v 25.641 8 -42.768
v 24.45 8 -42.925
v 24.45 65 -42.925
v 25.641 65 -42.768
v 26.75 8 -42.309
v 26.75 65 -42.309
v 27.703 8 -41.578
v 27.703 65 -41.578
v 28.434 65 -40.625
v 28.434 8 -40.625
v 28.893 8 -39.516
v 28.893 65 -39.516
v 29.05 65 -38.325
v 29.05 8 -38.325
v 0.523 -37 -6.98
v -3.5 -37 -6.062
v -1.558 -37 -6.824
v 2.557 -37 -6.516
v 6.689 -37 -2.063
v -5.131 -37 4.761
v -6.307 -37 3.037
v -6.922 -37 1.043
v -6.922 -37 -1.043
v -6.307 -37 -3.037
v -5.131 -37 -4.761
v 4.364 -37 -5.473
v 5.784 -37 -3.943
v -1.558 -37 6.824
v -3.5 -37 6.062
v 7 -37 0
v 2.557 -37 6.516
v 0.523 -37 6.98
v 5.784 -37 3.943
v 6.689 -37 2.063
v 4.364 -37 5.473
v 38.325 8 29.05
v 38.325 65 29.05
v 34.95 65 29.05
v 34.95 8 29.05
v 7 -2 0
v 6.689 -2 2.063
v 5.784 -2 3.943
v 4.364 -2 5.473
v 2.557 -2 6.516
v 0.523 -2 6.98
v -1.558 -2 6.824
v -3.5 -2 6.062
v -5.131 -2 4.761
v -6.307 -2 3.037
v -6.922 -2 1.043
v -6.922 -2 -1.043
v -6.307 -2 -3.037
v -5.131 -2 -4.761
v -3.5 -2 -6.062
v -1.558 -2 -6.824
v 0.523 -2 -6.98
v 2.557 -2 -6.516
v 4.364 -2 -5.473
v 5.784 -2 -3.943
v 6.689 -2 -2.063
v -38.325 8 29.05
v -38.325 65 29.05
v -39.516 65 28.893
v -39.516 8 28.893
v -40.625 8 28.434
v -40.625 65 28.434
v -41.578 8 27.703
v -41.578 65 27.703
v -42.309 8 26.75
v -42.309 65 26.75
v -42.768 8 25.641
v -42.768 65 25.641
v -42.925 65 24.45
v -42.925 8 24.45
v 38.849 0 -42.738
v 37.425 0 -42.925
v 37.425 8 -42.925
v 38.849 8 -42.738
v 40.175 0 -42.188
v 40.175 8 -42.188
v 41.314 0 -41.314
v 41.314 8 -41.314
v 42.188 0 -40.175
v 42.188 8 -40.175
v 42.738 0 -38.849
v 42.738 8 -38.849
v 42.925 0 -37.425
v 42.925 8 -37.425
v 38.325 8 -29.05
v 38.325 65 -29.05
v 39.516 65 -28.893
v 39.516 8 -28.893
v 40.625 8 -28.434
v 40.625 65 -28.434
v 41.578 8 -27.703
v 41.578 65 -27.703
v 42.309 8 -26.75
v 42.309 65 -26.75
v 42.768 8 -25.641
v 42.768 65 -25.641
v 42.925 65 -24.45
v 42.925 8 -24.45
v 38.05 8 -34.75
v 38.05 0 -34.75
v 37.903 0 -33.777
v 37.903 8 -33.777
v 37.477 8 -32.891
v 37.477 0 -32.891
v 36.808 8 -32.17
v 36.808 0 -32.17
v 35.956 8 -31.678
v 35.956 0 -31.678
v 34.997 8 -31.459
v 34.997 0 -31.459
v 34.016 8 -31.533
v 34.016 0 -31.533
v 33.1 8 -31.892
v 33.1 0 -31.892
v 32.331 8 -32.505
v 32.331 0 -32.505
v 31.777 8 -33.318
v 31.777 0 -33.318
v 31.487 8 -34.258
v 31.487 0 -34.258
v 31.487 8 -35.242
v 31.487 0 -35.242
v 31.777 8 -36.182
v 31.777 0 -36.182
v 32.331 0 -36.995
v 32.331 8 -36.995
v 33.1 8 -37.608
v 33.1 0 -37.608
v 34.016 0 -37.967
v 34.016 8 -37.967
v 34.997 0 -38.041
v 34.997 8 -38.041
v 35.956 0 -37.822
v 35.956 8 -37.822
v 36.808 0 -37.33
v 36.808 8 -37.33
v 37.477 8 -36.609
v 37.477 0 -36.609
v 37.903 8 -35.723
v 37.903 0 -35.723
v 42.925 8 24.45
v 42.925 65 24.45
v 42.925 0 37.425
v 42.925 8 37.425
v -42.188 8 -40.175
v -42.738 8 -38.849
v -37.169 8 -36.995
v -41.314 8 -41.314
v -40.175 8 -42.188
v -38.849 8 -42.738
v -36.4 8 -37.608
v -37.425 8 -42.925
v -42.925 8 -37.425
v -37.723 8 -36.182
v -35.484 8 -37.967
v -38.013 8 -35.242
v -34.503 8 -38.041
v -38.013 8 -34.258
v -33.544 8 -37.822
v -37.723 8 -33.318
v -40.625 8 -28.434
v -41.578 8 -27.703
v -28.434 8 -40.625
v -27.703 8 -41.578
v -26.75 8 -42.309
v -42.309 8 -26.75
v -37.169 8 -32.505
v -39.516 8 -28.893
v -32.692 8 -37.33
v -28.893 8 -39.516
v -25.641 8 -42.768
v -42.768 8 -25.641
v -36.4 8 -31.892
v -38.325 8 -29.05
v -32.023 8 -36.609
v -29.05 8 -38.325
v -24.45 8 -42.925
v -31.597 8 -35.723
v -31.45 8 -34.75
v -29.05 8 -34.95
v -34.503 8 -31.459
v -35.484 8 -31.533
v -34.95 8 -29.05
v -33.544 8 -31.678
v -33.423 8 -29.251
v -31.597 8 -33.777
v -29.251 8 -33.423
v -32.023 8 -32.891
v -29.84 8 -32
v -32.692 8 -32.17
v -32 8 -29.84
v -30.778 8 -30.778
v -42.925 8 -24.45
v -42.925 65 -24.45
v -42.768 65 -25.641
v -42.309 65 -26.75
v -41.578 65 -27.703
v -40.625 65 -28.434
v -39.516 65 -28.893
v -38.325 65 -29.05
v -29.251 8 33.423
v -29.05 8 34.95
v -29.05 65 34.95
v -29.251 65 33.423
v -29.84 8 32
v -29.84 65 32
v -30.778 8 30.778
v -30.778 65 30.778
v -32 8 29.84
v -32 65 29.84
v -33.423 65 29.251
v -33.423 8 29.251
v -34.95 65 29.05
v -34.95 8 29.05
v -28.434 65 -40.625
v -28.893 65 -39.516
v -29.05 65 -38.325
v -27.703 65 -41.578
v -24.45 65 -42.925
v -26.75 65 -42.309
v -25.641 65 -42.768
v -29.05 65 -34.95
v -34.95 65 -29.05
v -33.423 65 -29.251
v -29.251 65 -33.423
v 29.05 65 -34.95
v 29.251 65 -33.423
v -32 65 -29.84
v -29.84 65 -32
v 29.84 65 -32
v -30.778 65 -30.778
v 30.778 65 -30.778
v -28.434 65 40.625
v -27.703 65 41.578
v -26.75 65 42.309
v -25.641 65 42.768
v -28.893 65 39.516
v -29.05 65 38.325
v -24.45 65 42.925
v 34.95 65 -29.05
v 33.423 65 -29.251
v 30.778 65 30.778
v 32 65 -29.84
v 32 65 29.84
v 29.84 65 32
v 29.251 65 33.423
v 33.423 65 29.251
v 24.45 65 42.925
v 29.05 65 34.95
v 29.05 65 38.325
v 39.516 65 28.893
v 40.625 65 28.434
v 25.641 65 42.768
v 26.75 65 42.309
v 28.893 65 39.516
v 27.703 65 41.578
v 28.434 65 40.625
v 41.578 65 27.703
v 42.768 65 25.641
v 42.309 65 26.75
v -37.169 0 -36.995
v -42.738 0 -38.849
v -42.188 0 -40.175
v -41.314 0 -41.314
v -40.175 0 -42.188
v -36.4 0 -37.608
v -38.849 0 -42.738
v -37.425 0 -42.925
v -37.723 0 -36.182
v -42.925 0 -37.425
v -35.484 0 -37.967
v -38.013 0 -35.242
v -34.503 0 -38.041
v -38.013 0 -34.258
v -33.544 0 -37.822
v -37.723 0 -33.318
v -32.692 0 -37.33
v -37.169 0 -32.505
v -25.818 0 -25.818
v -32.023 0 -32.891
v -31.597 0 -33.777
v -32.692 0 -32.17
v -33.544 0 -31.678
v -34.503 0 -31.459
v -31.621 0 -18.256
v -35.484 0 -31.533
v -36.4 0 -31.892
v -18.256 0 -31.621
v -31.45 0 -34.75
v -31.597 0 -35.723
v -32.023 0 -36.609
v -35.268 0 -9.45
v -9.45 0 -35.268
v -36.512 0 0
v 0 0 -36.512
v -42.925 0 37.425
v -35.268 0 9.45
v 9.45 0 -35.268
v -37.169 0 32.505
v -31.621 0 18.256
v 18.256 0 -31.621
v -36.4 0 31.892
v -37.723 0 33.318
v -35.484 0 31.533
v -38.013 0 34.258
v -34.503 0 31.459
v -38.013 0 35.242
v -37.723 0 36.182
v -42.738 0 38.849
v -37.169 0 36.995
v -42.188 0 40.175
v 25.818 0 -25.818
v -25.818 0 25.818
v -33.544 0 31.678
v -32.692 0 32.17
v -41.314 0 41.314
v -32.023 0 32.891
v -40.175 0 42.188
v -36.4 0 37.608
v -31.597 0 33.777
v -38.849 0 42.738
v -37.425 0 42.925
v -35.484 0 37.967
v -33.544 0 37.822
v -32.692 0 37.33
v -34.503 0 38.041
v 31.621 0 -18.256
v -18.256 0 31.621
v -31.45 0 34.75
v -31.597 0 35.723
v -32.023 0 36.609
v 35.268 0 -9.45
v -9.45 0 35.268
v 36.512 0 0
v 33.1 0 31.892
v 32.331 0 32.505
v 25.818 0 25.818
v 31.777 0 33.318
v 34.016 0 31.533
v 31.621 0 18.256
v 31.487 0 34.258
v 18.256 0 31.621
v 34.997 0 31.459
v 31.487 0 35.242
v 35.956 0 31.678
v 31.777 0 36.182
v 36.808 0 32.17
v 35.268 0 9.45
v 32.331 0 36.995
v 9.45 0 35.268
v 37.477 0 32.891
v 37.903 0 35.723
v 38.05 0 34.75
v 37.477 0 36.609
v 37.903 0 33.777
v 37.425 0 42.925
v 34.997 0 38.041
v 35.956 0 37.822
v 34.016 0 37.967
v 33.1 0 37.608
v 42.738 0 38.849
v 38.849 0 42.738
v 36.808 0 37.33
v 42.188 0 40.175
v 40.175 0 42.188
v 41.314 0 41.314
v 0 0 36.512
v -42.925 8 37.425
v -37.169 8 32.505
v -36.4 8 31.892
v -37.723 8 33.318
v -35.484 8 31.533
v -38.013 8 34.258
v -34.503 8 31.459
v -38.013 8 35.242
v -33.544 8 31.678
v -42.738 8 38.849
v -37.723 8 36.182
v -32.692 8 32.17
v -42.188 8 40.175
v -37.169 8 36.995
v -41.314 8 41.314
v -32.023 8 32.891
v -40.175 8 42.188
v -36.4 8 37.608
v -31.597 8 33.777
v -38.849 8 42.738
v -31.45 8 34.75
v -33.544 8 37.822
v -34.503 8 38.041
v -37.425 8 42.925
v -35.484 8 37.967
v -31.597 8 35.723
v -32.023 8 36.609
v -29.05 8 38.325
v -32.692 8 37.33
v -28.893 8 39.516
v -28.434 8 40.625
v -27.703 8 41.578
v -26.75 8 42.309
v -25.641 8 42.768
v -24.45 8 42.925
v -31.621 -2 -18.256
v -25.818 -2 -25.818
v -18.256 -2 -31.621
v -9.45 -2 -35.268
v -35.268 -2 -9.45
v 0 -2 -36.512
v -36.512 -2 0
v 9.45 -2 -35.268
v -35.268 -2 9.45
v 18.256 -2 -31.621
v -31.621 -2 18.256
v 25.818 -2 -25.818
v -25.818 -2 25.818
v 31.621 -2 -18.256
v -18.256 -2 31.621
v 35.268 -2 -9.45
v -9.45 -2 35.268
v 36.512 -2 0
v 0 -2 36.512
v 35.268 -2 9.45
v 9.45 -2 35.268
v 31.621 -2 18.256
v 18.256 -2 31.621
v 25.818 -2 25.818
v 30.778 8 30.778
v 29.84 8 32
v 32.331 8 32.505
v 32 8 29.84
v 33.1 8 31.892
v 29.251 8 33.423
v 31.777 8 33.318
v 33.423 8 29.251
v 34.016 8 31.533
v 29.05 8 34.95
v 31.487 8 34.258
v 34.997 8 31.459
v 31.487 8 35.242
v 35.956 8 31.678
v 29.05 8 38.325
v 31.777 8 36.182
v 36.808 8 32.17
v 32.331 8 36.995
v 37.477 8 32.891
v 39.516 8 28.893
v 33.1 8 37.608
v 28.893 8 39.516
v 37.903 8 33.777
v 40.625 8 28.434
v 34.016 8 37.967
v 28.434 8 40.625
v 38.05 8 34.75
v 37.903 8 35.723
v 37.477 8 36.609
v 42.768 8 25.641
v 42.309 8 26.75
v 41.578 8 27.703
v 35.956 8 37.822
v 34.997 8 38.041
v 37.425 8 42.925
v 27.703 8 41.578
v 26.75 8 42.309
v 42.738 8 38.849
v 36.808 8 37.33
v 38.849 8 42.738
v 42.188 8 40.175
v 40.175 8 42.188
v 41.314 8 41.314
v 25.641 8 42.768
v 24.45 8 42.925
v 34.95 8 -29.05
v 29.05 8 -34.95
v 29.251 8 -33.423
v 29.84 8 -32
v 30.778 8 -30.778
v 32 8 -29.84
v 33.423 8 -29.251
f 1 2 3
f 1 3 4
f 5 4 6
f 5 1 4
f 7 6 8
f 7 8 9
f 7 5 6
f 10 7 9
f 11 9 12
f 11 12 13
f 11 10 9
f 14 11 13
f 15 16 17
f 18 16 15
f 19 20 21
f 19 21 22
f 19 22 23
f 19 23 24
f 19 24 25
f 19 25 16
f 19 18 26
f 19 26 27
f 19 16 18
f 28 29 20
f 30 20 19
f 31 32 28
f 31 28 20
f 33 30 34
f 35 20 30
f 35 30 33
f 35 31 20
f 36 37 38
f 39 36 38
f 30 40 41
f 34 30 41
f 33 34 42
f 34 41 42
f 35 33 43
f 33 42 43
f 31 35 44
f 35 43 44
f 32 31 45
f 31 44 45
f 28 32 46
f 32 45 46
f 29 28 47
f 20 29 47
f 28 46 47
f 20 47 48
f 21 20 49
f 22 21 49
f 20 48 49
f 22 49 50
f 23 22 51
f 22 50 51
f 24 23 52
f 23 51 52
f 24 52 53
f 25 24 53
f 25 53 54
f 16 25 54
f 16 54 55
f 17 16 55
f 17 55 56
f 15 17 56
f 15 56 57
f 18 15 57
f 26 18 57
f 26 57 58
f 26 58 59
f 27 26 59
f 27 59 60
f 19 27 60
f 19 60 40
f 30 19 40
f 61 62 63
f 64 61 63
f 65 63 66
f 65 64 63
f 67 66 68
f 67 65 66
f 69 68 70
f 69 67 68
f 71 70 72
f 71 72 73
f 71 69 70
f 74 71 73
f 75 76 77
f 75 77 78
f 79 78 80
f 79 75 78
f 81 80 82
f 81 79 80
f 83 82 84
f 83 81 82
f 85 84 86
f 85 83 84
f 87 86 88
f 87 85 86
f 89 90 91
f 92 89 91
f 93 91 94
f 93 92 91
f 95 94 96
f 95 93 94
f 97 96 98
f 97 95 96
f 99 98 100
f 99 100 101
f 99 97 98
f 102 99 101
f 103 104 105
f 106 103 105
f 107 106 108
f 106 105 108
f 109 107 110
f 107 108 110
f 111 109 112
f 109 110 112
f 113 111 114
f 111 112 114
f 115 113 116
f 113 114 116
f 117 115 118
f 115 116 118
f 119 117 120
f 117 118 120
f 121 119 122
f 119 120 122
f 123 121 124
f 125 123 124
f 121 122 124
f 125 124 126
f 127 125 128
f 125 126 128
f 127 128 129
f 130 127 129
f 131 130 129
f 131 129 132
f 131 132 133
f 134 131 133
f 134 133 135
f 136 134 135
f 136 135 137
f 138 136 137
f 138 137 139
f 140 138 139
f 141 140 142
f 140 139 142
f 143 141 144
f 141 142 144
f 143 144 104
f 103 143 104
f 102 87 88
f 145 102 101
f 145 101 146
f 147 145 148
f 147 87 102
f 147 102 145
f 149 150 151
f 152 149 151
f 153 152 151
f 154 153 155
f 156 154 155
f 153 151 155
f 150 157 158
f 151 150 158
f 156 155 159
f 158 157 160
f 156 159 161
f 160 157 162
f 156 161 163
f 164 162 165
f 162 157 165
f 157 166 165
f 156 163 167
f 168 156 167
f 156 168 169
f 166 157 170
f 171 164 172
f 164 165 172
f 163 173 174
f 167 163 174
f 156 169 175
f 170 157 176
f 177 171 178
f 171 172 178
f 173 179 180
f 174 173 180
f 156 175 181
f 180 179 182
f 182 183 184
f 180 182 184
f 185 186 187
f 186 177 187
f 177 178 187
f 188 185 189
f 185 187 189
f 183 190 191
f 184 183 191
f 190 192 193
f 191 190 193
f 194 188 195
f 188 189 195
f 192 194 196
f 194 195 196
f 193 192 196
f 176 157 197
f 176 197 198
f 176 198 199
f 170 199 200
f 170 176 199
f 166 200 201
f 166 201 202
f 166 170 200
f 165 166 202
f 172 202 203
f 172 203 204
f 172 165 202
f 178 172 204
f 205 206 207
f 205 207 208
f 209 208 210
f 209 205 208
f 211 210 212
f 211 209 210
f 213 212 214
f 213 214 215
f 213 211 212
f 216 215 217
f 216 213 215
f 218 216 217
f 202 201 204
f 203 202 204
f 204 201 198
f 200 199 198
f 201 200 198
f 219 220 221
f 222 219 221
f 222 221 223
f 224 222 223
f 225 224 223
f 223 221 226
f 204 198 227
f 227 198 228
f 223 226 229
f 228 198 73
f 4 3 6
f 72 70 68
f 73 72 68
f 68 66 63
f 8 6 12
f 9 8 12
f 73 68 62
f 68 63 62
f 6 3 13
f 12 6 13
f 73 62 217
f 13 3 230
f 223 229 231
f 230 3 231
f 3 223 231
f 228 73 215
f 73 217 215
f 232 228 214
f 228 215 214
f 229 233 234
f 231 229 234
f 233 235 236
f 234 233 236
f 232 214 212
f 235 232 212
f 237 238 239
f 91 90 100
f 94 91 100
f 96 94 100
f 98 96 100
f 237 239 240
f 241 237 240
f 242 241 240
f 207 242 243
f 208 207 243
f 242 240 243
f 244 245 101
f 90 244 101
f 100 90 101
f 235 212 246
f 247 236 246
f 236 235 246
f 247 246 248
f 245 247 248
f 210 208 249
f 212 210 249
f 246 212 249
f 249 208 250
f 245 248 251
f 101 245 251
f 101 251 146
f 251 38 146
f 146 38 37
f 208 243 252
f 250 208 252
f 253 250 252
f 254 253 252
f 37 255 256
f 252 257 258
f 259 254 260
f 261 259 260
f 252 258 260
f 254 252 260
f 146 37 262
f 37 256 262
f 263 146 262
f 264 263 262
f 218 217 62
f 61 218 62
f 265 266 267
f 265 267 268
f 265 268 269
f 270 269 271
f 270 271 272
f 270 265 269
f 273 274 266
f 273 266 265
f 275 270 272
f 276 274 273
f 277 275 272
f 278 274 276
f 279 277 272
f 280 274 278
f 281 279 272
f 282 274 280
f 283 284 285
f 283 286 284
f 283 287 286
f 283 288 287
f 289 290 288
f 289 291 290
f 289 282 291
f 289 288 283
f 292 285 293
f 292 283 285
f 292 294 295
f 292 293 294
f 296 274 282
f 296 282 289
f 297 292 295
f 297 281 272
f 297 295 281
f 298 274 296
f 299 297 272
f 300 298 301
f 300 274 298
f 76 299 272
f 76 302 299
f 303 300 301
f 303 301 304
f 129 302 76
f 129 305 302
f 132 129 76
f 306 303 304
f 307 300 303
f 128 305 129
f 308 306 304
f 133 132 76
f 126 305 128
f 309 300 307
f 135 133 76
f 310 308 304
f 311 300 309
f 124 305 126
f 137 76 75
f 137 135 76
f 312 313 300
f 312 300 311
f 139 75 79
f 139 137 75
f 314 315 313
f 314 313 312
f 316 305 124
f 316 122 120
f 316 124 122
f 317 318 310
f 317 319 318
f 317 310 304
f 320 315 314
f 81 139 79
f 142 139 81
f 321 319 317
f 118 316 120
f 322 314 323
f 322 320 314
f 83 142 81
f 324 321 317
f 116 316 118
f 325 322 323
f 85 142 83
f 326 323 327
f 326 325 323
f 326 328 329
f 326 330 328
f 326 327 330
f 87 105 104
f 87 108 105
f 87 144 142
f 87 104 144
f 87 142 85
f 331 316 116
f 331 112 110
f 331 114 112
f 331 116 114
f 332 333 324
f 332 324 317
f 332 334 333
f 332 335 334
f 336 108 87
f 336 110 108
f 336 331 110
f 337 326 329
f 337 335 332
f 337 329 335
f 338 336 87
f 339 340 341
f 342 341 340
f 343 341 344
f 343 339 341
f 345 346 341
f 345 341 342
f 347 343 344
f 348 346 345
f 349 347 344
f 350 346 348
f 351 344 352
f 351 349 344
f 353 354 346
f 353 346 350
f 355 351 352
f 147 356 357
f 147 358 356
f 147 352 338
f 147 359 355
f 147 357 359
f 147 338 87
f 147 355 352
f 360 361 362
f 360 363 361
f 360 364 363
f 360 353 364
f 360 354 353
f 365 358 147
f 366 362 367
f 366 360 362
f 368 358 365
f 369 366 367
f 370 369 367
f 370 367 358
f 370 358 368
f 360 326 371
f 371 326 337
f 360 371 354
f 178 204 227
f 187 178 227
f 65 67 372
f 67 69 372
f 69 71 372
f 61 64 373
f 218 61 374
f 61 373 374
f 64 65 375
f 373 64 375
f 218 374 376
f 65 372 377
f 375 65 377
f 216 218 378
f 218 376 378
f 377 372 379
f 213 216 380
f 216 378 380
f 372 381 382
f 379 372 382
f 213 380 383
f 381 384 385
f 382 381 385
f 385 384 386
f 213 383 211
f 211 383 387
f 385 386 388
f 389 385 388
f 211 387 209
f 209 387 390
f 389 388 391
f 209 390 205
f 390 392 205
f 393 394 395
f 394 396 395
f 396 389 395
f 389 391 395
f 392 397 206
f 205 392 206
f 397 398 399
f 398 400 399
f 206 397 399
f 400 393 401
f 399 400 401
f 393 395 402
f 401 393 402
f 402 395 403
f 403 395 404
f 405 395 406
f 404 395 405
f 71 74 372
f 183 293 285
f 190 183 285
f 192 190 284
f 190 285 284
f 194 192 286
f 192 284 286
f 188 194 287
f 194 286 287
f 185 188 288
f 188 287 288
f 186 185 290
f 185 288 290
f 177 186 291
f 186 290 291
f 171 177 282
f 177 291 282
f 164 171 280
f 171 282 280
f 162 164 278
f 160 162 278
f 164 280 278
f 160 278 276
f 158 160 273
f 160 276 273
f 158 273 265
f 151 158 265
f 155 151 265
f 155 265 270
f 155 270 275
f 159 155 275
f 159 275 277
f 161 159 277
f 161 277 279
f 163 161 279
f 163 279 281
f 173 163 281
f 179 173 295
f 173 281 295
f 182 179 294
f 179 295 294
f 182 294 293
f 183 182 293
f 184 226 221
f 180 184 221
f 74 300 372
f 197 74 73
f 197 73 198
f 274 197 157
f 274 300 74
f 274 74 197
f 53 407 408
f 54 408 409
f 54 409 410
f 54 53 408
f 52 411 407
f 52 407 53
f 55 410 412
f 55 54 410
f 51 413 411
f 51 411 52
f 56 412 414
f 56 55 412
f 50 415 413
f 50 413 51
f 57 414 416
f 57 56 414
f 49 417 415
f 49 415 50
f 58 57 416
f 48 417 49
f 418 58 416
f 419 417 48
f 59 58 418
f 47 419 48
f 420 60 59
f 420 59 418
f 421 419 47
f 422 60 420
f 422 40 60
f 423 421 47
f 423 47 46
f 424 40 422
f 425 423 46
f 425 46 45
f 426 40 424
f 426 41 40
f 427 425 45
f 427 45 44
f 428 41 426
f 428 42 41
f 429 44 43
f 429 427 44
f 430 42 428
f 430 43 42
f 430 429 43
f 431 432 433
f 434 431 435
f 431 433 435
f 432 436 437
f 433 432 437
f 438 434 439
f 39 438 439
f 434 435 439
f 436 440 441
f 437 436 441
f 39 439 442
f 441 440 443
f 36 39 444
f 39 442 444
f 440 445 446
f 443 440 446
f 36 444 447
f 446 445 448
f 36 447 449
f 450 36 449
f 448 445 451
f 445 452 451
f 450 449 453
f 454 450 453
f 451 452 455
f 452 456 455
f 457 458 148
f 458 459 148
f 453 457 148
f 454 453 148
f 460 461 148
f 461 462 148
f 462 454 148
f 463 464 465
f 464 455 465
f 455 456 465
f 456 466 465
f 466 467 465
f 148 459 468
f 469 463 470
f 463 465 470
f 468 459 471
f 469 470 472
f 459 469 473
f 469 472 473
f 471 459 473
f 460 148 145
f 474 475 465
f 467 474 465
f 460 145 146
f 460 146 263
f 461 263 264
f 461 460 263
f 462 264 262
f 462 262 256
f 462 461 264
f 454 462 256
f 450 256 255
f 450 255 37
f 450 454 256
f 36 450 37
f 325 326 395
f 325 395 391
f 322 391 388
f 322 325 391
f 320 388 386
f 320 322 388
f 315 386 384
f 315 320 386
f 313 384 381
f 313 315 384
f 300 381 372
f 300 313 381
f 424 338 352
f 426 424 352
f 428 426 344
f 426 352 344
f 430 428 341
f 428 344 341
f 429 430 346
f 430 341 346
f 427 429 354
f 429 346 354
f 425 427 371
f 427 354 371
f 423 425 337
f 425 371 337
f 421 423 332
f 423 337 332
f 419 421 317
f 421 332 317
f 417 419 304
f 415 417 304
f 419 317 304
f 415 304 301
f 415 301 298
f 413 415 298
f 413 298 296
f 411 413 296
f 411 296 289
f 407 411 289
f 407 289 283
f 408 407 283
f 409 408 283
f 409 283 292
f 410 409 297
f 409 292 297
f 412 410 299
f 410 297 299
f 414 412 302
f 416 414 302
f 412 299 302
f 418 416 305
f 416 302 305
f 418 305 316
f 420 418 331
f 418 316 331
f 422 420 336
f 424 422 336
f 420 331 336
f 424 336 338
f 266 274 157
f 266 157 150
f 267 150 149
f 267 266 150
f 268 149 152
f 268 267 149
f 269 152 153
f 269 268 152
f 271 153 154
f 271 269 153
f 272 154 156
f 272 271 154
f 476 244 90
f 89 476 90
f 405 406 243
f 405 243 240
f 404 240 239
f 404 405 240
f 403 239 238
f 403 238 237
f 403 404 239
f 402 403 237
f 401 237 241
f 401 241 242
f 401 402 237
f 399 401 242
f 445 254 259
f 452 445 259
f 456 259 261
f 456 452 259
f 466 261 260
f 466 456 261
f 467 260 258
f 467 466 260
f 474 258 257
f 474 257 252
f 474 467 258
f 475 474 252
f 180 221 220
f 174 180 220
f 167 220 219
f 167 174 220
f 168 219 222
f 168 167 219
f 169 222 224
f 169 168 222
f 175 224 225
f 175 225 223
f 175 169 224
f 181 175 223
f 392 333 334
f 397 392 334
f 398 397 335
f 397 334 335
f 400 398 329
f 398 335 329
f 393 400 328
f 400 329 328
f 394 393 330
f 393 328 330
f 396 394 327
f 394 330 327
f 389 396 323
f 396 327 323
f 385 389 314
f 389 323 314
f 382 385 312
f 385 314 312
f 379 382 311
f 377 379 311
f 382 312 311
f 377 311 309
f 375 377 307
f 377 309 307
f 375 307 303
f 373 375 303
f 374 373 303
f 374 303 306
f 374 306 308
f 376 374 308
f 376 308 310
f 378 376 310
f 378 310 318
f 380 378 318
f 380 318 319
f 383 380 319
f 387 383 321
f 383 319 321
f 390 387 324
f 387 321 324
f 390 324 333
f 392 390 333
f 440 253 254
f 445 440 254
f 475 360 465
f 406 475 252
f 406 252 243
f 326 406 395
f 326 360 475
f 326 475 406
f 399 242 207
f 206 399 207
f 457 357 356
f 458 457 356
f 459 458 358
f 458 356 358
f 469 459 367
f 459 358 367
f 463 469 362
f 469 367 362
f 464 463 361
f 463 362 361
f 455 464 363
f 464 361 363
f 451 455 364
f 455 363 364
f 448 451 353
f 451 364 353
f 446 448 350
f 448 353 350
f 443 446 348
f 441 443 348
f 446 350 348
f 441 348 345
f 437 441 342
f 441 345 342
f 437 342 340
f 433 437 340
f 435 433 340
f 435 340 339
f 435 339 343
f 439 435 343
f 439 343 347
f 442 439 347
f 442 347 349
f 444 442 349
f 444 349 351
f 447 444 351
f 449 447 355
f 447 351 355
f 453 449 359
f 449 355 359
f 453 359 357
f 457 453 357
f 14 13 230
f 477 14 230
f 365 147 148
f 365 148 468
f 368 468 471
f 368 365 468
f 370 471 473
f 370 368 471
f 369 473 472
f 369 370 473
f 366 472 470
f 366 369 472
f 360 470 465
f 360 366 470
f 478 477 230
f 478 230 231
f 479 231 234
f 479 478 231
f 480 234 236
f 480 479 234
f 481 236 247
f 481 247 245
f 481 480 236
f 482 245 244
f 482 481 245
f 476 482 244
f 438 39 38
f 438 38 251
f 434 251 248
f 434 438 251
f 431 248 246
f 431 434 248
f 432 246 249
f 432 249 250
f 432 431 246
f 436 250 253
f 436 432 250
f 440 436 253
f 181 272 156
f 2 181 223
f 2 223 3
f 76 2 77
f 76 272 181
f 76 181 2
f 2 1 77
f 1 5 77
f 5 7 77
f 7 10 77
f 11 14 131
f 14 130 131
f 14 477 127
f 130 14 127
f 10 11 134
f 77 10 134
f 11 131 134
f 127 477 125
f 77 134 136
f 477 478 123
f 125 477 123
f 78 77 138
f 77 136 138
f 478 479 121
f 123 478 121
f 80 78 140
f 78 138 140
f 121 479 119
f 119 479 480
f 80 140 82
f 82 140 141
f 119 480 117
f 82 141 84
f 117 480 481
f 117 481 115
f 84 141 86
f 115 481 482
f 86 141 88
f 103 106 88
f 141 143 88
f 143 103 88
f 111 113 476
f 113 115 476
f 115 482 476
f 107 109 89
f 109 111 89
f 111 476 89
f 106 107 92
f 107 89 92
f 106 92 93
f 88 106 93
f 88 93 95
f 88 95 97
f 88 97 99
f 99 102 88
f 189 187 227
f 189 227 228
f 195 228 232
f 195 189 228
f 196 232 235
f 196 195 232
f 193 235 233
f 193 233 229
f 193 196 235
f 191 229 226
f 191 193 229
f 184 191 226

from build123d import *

# Parameters (mm, degrees)
F0_R     = 36.5125
F0_R_2   = 7
F2_DEPTH = 2
F3_DEPTH = 37
F0_R_3   = 3.3
F4_DEPTH = 8
F5_DEPTH = 65


with BuildPart() as f2:
    # F0 (on Front) → F2 (new body)
    with BuildSketch(Plane.XZ):
        Circle(F0_R)
        Circle(F0_R_2, mode=Mode.SUBTRACT)
    extrude(amount=F2_DEPTH)

    # F0 (on Front) → F3 (join)
    with BuildSketch(Plane.XZ):
        Circle(F0_R_2)
    extrude(amount=F3_DEPTH)



with BuildPart() as f4:
    # F0 (on Front) → F4 (new body)
    with BuildSketch(Plane.XZ):
        with BuildLine():
            ThreePointArc((42.925, 37.425), (41.314087, 41.314087), (37.425, 42.925))
            Line((37.425, 42.925), (-37.425, 42.925))
            ThreePointArc((-37.425, 42.925), (-41.314087, 41.314087), (-42.925, 37.425))
            Line((-42.925, 37.425), (-42.925, -37.425))
            ThreePointArc((-42.925, -37.425), (-41.314087, -41.314087), (-37.425, -42.925))
            Line((-37.425, -42.925), (37.425, -42.925))
            ThreePointArc((37.425, -42.925), (41.314087, -41.314087), (42.925, -37.425))
            Line((42.925, -37.425), (42.925, 37.425))
        make_face()
        with Locations((-34.75, -34.75)):
            Circle(F0_R_3, mode=Mode.SUBTRACT)
        with Locations((34.75, -34.75)):
            Circle(F0_R_3, mode=Mode.SUBTRACT)
        with Locations((-34.75, 34.75)):
            Circle(F0_R_3, mode=Mode.SUBTRACT)
        Circle(F0_R, mode=Mode.SUBTRACT)
        with Locations((34.75, 34.75)):
            Circle(F0_R_3, mode=Mode.SUBTRACT)
        Circle(F0_R)
        Circle(F0_R_2, mode=Mode.SUBTRACT)
    extrude(amount=-F4_DEPTH)


with BuildPart() as f2_1:
    add(f2.part)

    add(f4.part)  # F5 merges F4
    # F1 (on Front) → F5 (join)
    with BuildSketch(Plane.XZ):
        with BuildLine():
            ThreePointArc((29.05, 38.325), (27.702691, 41.577691), (24.45, 42.925))
            Line((24.45, 42.925), (-24.45, 42.925))
            ThreePointArc((-24.45, 42.925), (-27.702691, 41.577691), (-29.05, 38.325))
            Line((-29.05, 38.325), (-29.05, 34.95))
            ThreePointArc((-29.05, 34.95), (-30.77807, 30.77807), (-34.95, 29.05))
            Line((-34.95, 29.05), (-38.325, 29.05))
            ThreePointArc((-38.325, 29.05), (-41.577691, 27.702691), (-42.925, 24.45))
            Line((-42.925, 24.45), (-42.925, -24.45))
            ThreePointArc((-42.925, -24.45), (-41.577691, -27.702691), (-38.325, -29.05))
            Line((-38.325, -29.05), (-34.95, -29.05))
            ThreePointArc((-34.95, -29.05), (-30.77807, -30.77807), (-29.05, -34.95))
            Line((-29.05, -34.95), (-29.05, -38.325))
            ThreePointArc((-29.05, -38.325), (-27.702691, -41.577691), (-24.45, -42.925))
            Line((-24.45, -42.925), (24.45, -42.925))
            ThreePointArc((24.45, -42.925), (27.702691, -41.577691), (29.05, -38.325))
            Line((29.05, -38.325), (29.05, -34.95))
            ThreePointArc((29.05, -34.95), (30.77807, -30.77807), (34.95, -29.05))
            Line((34.95, -29.05), (38.325, -29.05))
            ThreePointArc((38.325, -29.05), (41.577691, -27.702691), (42.925, -24.45))
            Line((42.925, -24.45), (42.925, 24.45))
            ThreePointArc((42.925, 24.45), (41.577691, 27.702691), (38.325, 29.05))
            Line((38.325, 29.05), (34.95, 29.05))
            ThreePointArc((34.95, 29.05), (30.77807, 30.77807), (29.05, 34.95))
            Line((29.05, 34.95), (29.05, 38.325))
        make_face()
    extrude(amount=-F5_DEPTH)


solid = f2_1.part
